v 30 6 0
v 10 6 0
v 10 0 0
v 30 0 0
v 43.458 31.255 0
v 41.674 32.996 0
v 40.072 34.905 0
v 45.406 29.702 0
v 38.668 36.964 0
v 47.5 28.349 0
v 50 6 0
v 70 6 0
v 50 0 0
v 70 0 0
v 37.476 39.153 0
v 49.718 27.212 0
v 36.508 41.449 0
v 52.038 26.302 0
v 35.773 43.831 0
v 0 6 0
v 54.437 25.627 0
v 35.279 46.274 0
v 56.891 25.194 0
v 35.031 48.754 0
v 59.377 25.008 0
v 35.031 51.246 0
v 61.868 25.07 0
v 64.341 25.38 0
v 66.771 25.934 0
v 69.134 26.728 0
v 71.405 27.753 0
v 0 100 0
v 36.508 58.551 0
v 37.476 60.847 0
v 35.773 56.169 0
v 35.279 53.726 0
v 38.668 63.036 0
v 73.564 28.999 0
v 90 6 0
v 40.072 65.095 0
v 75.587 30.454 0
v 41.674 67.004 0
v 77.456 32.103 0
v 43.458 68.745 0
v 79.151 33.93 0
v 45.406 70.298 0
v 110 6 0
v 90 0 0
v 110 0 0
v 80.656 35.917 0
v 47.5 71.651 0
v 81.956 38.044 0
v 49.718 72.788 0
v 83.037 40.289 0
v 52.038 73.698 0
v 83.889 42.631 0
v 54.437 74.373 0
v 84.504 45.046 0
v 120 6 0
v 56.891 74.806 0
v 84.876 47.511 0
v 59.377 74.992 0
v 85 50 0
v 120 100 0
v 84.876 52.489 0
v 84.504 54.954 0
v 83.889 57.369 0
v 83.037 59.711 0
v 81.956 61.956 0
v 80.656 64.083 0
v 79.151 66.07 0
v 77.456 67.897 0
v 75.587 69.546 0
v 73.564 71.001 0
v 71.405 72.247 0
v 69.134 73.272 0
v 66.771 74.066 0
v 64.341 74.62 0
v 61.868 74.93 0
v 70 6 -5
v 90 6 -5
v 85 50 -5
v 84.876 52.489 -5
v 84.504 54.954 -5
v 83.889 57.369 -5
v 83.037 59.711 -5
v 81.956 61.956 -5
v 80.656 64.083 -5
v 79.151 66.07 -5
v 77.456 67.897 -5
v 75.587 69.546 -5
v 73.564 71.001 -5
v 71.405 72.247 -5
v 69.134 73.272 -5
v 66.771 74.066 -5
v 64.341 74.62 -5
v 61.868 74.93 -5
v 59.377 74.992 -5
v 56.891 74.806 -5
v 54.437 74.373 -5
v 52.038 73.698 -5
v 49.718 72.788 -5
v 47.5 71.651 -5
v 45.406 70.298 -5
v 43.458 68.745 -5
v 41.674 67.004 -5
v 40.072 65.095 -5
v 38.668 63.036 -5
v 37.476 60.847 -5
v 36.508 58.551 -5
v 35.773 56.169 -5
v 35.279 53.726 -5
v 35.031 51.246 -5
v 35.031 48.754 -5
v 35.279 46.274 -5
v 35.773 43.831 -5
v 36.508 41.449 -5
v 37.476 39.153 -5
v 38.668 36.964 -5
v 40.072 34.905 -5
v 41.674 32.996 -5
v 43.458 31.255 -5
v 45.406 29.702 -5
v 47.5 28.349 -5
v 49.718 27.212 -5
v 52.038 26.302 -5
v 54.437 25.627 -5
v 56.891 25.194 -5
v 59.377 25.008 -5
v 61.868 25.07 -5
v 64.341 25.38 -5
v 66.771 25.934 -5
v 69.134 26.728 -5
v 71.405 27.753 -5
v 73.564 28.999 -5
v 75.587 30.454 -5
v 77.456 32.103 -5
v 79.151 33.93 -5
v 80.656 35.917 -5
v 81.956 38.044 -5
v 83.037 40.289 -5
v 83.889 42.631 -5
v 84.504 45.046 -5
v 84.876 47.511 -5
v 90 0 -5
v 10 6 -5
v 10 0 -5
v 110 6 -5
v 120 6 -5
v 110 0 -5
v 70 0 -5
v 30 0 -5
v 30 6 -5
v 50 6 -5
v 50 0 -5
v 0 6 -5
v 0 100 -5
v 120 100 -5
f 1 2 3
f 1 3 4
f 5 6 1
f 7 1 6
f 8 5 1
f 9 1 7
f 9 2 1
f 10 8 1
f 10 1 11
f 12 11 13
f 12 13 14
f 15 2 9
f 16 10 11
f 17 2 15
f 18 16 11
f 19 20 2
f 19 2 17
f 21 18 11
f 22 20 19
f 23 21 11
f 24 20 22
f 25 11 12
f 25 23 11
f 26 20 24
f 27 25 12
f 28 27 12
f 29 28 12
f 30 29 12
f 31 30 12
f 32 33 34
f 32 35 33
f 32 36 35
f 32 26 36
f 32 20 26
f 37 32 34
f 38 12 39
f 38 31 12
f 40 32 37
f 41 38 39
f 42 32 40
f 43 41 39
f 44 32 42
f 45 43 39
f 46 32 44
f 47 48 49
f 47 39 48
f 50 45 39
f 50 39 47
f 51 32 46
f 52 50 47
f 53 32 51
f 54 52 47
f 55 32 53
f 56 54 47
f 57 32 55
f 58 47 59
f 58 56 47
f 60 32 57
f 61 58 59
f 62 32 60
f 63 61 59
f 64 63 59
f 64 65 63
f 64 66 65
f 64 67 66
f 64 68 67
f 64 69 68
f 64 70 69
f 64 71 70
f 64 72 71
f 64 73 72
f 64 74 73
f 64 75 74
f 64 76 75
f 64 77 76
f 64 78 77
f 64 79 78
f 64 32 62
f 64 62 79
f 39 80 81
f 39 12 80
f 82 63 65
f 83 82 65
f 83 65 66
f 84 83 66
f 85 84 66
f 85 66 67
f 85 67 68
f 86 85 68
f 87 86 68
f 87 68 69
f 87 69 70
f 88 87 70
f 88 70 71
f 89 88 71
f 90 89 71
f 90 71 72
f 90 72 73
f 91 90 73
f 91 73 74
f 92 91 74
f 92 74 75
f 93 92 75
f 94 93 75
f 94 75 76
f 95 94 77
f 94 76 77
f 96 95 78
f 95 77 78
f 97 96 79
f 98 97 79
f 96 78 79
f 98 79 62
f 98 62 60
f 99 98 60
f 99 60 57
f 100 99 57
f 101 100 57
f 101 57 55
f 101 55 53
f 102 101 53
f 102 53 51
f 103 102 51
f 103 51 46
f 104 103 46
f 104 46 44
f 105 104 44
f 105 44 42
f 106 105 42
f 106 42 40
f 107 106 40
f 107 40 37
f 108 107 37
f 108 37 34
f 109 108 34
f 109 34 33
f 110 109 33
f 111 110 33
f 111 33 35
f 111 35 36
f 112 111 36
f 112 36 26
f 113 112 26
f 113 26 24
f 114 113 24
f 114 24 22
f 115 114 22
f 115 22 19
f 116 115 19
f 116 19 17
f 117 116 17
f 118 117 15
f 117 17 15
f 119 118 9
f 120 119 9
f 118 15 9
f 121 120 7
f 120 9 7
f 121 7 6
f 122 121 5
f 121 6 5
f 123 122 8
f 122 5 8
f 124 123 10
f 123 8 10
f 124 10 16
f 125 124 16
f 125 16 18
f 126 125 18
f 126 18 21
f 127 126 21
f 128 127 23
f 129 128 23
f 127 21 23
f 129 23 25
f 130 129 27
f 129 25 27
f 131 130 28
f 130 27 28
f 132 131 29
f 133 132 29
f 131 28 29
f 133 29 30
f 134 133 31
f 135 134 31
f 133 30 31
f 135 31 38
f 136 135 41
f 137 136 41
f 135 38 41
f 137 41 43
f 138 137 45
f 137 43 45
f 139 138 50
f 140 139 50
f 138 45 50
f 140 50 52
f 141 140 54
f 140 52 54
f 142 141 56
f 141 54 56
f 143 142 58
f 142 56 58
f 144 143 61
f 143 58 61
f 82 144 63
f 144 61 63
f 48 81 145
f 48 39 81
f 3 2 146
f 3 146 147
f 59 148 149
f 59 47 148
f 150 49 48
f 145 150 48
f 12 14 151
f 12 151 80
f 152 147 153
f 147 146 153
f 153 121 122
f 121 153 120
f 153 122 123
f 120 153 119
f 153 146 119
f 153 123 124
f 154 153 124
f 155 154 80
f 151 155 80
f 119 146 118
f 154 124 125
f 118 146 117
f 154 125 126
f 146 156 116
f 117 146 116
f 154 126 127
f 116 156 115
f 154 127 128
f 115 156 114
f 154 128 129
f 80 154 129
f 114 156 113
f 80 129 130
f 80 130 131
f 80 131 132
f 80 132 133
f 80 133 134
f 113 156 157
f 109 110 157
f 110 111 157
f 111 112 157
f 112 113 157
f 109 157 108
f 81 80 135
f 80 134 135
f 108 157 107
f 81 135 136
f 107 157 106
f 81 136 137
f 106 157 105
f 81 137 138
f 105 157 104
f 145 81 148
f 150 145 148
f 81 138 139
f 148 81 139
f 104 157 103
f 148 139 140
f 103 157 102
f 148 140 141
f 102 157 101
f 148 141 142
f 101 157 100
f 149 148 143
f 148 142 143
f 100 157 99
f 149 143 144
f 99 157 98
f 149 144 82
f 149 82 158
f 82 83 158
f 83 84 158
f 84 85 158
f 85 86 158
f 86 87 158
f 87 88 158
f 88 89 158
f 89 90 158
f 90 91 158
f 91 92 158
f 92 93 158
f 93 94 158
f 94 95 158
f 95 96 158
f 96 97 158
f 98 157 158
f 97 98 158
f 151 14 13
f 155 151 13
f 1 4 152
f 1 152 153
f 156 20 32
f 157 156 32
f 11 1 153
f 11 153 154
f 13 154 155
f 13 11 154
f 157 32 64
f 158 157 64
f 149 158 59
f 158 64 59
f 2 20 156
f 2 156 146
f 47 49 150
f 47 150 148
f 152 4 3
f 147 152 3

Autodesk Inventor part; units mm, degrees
ref_plane "YZ Plane" through (0, 0, 0) normal (1, 0, 0) x (0, 1, 0)
ref_plane "XZ Plane" through (0, 0, 0) normal (0, 1, 0) x (-1, 0, 0)
ref_plane "XY Plane" through (0, 0, 0) normal (0, 0, 1) x (1, 0, 0)
sketch "Sketch1" plane through (0, 0, 0) normal (0, 0, 1) x (1, 0, 0)
  line L0 (0, 0) -> (0, 100)
  line L1 (0, 100) -> (120, 100)
  line L2 (120, 100) -> (120, 0)
  line L3 (120, 0) -> (0, 0)
  circle A0 centre (60, 50) radius 25
  line L4 (0, 0) -> (0, 6)
  line L5 (0, 6) -> (10, 6)
  line L6 (10, 6) -> (10, 0)
  line L7 (10, 0) -> (30, 0)
  line L8 (30, 0) -> (30, 6)
  line L9 (30, 6) -> (50, 6)
  line L10 (50, 6) -> (50, 0)
  line L11 (50, 0) -> (70, 0)
  line L12 (70, 0) -> (70, 6)
  line L13 (70, 6) -> (90, 6)
  line L14 (90, 6) -> (90, 0)
  line L15 (90, 0) -> (110, 0)
  line L16 (110, 0) -> (110, 6)
  line L17 (110, 6) -> (120, 6)
  dimension "d3" = 100
  dimension "d4" = 120
  dimension "d6" = 50
  dimension "d9" = 50
  dimension "d10" = 60
  dimension "d11" = 6
  dimension "d12" = 10
  dimension "d13" = 20
  dimension "d14" = 20
  dimension "d15" = 20
  dimension "d16" = 20
  dimension "d17" = 20
extrude "Extrusion1" add sketch "Sketch1" against normal blind 5 contours L0 L1 L2 L17 L16 L3 L14 L13 L12 L10 L9 L8 L6 L5
properties part number "Archimedes Screw Border1"
